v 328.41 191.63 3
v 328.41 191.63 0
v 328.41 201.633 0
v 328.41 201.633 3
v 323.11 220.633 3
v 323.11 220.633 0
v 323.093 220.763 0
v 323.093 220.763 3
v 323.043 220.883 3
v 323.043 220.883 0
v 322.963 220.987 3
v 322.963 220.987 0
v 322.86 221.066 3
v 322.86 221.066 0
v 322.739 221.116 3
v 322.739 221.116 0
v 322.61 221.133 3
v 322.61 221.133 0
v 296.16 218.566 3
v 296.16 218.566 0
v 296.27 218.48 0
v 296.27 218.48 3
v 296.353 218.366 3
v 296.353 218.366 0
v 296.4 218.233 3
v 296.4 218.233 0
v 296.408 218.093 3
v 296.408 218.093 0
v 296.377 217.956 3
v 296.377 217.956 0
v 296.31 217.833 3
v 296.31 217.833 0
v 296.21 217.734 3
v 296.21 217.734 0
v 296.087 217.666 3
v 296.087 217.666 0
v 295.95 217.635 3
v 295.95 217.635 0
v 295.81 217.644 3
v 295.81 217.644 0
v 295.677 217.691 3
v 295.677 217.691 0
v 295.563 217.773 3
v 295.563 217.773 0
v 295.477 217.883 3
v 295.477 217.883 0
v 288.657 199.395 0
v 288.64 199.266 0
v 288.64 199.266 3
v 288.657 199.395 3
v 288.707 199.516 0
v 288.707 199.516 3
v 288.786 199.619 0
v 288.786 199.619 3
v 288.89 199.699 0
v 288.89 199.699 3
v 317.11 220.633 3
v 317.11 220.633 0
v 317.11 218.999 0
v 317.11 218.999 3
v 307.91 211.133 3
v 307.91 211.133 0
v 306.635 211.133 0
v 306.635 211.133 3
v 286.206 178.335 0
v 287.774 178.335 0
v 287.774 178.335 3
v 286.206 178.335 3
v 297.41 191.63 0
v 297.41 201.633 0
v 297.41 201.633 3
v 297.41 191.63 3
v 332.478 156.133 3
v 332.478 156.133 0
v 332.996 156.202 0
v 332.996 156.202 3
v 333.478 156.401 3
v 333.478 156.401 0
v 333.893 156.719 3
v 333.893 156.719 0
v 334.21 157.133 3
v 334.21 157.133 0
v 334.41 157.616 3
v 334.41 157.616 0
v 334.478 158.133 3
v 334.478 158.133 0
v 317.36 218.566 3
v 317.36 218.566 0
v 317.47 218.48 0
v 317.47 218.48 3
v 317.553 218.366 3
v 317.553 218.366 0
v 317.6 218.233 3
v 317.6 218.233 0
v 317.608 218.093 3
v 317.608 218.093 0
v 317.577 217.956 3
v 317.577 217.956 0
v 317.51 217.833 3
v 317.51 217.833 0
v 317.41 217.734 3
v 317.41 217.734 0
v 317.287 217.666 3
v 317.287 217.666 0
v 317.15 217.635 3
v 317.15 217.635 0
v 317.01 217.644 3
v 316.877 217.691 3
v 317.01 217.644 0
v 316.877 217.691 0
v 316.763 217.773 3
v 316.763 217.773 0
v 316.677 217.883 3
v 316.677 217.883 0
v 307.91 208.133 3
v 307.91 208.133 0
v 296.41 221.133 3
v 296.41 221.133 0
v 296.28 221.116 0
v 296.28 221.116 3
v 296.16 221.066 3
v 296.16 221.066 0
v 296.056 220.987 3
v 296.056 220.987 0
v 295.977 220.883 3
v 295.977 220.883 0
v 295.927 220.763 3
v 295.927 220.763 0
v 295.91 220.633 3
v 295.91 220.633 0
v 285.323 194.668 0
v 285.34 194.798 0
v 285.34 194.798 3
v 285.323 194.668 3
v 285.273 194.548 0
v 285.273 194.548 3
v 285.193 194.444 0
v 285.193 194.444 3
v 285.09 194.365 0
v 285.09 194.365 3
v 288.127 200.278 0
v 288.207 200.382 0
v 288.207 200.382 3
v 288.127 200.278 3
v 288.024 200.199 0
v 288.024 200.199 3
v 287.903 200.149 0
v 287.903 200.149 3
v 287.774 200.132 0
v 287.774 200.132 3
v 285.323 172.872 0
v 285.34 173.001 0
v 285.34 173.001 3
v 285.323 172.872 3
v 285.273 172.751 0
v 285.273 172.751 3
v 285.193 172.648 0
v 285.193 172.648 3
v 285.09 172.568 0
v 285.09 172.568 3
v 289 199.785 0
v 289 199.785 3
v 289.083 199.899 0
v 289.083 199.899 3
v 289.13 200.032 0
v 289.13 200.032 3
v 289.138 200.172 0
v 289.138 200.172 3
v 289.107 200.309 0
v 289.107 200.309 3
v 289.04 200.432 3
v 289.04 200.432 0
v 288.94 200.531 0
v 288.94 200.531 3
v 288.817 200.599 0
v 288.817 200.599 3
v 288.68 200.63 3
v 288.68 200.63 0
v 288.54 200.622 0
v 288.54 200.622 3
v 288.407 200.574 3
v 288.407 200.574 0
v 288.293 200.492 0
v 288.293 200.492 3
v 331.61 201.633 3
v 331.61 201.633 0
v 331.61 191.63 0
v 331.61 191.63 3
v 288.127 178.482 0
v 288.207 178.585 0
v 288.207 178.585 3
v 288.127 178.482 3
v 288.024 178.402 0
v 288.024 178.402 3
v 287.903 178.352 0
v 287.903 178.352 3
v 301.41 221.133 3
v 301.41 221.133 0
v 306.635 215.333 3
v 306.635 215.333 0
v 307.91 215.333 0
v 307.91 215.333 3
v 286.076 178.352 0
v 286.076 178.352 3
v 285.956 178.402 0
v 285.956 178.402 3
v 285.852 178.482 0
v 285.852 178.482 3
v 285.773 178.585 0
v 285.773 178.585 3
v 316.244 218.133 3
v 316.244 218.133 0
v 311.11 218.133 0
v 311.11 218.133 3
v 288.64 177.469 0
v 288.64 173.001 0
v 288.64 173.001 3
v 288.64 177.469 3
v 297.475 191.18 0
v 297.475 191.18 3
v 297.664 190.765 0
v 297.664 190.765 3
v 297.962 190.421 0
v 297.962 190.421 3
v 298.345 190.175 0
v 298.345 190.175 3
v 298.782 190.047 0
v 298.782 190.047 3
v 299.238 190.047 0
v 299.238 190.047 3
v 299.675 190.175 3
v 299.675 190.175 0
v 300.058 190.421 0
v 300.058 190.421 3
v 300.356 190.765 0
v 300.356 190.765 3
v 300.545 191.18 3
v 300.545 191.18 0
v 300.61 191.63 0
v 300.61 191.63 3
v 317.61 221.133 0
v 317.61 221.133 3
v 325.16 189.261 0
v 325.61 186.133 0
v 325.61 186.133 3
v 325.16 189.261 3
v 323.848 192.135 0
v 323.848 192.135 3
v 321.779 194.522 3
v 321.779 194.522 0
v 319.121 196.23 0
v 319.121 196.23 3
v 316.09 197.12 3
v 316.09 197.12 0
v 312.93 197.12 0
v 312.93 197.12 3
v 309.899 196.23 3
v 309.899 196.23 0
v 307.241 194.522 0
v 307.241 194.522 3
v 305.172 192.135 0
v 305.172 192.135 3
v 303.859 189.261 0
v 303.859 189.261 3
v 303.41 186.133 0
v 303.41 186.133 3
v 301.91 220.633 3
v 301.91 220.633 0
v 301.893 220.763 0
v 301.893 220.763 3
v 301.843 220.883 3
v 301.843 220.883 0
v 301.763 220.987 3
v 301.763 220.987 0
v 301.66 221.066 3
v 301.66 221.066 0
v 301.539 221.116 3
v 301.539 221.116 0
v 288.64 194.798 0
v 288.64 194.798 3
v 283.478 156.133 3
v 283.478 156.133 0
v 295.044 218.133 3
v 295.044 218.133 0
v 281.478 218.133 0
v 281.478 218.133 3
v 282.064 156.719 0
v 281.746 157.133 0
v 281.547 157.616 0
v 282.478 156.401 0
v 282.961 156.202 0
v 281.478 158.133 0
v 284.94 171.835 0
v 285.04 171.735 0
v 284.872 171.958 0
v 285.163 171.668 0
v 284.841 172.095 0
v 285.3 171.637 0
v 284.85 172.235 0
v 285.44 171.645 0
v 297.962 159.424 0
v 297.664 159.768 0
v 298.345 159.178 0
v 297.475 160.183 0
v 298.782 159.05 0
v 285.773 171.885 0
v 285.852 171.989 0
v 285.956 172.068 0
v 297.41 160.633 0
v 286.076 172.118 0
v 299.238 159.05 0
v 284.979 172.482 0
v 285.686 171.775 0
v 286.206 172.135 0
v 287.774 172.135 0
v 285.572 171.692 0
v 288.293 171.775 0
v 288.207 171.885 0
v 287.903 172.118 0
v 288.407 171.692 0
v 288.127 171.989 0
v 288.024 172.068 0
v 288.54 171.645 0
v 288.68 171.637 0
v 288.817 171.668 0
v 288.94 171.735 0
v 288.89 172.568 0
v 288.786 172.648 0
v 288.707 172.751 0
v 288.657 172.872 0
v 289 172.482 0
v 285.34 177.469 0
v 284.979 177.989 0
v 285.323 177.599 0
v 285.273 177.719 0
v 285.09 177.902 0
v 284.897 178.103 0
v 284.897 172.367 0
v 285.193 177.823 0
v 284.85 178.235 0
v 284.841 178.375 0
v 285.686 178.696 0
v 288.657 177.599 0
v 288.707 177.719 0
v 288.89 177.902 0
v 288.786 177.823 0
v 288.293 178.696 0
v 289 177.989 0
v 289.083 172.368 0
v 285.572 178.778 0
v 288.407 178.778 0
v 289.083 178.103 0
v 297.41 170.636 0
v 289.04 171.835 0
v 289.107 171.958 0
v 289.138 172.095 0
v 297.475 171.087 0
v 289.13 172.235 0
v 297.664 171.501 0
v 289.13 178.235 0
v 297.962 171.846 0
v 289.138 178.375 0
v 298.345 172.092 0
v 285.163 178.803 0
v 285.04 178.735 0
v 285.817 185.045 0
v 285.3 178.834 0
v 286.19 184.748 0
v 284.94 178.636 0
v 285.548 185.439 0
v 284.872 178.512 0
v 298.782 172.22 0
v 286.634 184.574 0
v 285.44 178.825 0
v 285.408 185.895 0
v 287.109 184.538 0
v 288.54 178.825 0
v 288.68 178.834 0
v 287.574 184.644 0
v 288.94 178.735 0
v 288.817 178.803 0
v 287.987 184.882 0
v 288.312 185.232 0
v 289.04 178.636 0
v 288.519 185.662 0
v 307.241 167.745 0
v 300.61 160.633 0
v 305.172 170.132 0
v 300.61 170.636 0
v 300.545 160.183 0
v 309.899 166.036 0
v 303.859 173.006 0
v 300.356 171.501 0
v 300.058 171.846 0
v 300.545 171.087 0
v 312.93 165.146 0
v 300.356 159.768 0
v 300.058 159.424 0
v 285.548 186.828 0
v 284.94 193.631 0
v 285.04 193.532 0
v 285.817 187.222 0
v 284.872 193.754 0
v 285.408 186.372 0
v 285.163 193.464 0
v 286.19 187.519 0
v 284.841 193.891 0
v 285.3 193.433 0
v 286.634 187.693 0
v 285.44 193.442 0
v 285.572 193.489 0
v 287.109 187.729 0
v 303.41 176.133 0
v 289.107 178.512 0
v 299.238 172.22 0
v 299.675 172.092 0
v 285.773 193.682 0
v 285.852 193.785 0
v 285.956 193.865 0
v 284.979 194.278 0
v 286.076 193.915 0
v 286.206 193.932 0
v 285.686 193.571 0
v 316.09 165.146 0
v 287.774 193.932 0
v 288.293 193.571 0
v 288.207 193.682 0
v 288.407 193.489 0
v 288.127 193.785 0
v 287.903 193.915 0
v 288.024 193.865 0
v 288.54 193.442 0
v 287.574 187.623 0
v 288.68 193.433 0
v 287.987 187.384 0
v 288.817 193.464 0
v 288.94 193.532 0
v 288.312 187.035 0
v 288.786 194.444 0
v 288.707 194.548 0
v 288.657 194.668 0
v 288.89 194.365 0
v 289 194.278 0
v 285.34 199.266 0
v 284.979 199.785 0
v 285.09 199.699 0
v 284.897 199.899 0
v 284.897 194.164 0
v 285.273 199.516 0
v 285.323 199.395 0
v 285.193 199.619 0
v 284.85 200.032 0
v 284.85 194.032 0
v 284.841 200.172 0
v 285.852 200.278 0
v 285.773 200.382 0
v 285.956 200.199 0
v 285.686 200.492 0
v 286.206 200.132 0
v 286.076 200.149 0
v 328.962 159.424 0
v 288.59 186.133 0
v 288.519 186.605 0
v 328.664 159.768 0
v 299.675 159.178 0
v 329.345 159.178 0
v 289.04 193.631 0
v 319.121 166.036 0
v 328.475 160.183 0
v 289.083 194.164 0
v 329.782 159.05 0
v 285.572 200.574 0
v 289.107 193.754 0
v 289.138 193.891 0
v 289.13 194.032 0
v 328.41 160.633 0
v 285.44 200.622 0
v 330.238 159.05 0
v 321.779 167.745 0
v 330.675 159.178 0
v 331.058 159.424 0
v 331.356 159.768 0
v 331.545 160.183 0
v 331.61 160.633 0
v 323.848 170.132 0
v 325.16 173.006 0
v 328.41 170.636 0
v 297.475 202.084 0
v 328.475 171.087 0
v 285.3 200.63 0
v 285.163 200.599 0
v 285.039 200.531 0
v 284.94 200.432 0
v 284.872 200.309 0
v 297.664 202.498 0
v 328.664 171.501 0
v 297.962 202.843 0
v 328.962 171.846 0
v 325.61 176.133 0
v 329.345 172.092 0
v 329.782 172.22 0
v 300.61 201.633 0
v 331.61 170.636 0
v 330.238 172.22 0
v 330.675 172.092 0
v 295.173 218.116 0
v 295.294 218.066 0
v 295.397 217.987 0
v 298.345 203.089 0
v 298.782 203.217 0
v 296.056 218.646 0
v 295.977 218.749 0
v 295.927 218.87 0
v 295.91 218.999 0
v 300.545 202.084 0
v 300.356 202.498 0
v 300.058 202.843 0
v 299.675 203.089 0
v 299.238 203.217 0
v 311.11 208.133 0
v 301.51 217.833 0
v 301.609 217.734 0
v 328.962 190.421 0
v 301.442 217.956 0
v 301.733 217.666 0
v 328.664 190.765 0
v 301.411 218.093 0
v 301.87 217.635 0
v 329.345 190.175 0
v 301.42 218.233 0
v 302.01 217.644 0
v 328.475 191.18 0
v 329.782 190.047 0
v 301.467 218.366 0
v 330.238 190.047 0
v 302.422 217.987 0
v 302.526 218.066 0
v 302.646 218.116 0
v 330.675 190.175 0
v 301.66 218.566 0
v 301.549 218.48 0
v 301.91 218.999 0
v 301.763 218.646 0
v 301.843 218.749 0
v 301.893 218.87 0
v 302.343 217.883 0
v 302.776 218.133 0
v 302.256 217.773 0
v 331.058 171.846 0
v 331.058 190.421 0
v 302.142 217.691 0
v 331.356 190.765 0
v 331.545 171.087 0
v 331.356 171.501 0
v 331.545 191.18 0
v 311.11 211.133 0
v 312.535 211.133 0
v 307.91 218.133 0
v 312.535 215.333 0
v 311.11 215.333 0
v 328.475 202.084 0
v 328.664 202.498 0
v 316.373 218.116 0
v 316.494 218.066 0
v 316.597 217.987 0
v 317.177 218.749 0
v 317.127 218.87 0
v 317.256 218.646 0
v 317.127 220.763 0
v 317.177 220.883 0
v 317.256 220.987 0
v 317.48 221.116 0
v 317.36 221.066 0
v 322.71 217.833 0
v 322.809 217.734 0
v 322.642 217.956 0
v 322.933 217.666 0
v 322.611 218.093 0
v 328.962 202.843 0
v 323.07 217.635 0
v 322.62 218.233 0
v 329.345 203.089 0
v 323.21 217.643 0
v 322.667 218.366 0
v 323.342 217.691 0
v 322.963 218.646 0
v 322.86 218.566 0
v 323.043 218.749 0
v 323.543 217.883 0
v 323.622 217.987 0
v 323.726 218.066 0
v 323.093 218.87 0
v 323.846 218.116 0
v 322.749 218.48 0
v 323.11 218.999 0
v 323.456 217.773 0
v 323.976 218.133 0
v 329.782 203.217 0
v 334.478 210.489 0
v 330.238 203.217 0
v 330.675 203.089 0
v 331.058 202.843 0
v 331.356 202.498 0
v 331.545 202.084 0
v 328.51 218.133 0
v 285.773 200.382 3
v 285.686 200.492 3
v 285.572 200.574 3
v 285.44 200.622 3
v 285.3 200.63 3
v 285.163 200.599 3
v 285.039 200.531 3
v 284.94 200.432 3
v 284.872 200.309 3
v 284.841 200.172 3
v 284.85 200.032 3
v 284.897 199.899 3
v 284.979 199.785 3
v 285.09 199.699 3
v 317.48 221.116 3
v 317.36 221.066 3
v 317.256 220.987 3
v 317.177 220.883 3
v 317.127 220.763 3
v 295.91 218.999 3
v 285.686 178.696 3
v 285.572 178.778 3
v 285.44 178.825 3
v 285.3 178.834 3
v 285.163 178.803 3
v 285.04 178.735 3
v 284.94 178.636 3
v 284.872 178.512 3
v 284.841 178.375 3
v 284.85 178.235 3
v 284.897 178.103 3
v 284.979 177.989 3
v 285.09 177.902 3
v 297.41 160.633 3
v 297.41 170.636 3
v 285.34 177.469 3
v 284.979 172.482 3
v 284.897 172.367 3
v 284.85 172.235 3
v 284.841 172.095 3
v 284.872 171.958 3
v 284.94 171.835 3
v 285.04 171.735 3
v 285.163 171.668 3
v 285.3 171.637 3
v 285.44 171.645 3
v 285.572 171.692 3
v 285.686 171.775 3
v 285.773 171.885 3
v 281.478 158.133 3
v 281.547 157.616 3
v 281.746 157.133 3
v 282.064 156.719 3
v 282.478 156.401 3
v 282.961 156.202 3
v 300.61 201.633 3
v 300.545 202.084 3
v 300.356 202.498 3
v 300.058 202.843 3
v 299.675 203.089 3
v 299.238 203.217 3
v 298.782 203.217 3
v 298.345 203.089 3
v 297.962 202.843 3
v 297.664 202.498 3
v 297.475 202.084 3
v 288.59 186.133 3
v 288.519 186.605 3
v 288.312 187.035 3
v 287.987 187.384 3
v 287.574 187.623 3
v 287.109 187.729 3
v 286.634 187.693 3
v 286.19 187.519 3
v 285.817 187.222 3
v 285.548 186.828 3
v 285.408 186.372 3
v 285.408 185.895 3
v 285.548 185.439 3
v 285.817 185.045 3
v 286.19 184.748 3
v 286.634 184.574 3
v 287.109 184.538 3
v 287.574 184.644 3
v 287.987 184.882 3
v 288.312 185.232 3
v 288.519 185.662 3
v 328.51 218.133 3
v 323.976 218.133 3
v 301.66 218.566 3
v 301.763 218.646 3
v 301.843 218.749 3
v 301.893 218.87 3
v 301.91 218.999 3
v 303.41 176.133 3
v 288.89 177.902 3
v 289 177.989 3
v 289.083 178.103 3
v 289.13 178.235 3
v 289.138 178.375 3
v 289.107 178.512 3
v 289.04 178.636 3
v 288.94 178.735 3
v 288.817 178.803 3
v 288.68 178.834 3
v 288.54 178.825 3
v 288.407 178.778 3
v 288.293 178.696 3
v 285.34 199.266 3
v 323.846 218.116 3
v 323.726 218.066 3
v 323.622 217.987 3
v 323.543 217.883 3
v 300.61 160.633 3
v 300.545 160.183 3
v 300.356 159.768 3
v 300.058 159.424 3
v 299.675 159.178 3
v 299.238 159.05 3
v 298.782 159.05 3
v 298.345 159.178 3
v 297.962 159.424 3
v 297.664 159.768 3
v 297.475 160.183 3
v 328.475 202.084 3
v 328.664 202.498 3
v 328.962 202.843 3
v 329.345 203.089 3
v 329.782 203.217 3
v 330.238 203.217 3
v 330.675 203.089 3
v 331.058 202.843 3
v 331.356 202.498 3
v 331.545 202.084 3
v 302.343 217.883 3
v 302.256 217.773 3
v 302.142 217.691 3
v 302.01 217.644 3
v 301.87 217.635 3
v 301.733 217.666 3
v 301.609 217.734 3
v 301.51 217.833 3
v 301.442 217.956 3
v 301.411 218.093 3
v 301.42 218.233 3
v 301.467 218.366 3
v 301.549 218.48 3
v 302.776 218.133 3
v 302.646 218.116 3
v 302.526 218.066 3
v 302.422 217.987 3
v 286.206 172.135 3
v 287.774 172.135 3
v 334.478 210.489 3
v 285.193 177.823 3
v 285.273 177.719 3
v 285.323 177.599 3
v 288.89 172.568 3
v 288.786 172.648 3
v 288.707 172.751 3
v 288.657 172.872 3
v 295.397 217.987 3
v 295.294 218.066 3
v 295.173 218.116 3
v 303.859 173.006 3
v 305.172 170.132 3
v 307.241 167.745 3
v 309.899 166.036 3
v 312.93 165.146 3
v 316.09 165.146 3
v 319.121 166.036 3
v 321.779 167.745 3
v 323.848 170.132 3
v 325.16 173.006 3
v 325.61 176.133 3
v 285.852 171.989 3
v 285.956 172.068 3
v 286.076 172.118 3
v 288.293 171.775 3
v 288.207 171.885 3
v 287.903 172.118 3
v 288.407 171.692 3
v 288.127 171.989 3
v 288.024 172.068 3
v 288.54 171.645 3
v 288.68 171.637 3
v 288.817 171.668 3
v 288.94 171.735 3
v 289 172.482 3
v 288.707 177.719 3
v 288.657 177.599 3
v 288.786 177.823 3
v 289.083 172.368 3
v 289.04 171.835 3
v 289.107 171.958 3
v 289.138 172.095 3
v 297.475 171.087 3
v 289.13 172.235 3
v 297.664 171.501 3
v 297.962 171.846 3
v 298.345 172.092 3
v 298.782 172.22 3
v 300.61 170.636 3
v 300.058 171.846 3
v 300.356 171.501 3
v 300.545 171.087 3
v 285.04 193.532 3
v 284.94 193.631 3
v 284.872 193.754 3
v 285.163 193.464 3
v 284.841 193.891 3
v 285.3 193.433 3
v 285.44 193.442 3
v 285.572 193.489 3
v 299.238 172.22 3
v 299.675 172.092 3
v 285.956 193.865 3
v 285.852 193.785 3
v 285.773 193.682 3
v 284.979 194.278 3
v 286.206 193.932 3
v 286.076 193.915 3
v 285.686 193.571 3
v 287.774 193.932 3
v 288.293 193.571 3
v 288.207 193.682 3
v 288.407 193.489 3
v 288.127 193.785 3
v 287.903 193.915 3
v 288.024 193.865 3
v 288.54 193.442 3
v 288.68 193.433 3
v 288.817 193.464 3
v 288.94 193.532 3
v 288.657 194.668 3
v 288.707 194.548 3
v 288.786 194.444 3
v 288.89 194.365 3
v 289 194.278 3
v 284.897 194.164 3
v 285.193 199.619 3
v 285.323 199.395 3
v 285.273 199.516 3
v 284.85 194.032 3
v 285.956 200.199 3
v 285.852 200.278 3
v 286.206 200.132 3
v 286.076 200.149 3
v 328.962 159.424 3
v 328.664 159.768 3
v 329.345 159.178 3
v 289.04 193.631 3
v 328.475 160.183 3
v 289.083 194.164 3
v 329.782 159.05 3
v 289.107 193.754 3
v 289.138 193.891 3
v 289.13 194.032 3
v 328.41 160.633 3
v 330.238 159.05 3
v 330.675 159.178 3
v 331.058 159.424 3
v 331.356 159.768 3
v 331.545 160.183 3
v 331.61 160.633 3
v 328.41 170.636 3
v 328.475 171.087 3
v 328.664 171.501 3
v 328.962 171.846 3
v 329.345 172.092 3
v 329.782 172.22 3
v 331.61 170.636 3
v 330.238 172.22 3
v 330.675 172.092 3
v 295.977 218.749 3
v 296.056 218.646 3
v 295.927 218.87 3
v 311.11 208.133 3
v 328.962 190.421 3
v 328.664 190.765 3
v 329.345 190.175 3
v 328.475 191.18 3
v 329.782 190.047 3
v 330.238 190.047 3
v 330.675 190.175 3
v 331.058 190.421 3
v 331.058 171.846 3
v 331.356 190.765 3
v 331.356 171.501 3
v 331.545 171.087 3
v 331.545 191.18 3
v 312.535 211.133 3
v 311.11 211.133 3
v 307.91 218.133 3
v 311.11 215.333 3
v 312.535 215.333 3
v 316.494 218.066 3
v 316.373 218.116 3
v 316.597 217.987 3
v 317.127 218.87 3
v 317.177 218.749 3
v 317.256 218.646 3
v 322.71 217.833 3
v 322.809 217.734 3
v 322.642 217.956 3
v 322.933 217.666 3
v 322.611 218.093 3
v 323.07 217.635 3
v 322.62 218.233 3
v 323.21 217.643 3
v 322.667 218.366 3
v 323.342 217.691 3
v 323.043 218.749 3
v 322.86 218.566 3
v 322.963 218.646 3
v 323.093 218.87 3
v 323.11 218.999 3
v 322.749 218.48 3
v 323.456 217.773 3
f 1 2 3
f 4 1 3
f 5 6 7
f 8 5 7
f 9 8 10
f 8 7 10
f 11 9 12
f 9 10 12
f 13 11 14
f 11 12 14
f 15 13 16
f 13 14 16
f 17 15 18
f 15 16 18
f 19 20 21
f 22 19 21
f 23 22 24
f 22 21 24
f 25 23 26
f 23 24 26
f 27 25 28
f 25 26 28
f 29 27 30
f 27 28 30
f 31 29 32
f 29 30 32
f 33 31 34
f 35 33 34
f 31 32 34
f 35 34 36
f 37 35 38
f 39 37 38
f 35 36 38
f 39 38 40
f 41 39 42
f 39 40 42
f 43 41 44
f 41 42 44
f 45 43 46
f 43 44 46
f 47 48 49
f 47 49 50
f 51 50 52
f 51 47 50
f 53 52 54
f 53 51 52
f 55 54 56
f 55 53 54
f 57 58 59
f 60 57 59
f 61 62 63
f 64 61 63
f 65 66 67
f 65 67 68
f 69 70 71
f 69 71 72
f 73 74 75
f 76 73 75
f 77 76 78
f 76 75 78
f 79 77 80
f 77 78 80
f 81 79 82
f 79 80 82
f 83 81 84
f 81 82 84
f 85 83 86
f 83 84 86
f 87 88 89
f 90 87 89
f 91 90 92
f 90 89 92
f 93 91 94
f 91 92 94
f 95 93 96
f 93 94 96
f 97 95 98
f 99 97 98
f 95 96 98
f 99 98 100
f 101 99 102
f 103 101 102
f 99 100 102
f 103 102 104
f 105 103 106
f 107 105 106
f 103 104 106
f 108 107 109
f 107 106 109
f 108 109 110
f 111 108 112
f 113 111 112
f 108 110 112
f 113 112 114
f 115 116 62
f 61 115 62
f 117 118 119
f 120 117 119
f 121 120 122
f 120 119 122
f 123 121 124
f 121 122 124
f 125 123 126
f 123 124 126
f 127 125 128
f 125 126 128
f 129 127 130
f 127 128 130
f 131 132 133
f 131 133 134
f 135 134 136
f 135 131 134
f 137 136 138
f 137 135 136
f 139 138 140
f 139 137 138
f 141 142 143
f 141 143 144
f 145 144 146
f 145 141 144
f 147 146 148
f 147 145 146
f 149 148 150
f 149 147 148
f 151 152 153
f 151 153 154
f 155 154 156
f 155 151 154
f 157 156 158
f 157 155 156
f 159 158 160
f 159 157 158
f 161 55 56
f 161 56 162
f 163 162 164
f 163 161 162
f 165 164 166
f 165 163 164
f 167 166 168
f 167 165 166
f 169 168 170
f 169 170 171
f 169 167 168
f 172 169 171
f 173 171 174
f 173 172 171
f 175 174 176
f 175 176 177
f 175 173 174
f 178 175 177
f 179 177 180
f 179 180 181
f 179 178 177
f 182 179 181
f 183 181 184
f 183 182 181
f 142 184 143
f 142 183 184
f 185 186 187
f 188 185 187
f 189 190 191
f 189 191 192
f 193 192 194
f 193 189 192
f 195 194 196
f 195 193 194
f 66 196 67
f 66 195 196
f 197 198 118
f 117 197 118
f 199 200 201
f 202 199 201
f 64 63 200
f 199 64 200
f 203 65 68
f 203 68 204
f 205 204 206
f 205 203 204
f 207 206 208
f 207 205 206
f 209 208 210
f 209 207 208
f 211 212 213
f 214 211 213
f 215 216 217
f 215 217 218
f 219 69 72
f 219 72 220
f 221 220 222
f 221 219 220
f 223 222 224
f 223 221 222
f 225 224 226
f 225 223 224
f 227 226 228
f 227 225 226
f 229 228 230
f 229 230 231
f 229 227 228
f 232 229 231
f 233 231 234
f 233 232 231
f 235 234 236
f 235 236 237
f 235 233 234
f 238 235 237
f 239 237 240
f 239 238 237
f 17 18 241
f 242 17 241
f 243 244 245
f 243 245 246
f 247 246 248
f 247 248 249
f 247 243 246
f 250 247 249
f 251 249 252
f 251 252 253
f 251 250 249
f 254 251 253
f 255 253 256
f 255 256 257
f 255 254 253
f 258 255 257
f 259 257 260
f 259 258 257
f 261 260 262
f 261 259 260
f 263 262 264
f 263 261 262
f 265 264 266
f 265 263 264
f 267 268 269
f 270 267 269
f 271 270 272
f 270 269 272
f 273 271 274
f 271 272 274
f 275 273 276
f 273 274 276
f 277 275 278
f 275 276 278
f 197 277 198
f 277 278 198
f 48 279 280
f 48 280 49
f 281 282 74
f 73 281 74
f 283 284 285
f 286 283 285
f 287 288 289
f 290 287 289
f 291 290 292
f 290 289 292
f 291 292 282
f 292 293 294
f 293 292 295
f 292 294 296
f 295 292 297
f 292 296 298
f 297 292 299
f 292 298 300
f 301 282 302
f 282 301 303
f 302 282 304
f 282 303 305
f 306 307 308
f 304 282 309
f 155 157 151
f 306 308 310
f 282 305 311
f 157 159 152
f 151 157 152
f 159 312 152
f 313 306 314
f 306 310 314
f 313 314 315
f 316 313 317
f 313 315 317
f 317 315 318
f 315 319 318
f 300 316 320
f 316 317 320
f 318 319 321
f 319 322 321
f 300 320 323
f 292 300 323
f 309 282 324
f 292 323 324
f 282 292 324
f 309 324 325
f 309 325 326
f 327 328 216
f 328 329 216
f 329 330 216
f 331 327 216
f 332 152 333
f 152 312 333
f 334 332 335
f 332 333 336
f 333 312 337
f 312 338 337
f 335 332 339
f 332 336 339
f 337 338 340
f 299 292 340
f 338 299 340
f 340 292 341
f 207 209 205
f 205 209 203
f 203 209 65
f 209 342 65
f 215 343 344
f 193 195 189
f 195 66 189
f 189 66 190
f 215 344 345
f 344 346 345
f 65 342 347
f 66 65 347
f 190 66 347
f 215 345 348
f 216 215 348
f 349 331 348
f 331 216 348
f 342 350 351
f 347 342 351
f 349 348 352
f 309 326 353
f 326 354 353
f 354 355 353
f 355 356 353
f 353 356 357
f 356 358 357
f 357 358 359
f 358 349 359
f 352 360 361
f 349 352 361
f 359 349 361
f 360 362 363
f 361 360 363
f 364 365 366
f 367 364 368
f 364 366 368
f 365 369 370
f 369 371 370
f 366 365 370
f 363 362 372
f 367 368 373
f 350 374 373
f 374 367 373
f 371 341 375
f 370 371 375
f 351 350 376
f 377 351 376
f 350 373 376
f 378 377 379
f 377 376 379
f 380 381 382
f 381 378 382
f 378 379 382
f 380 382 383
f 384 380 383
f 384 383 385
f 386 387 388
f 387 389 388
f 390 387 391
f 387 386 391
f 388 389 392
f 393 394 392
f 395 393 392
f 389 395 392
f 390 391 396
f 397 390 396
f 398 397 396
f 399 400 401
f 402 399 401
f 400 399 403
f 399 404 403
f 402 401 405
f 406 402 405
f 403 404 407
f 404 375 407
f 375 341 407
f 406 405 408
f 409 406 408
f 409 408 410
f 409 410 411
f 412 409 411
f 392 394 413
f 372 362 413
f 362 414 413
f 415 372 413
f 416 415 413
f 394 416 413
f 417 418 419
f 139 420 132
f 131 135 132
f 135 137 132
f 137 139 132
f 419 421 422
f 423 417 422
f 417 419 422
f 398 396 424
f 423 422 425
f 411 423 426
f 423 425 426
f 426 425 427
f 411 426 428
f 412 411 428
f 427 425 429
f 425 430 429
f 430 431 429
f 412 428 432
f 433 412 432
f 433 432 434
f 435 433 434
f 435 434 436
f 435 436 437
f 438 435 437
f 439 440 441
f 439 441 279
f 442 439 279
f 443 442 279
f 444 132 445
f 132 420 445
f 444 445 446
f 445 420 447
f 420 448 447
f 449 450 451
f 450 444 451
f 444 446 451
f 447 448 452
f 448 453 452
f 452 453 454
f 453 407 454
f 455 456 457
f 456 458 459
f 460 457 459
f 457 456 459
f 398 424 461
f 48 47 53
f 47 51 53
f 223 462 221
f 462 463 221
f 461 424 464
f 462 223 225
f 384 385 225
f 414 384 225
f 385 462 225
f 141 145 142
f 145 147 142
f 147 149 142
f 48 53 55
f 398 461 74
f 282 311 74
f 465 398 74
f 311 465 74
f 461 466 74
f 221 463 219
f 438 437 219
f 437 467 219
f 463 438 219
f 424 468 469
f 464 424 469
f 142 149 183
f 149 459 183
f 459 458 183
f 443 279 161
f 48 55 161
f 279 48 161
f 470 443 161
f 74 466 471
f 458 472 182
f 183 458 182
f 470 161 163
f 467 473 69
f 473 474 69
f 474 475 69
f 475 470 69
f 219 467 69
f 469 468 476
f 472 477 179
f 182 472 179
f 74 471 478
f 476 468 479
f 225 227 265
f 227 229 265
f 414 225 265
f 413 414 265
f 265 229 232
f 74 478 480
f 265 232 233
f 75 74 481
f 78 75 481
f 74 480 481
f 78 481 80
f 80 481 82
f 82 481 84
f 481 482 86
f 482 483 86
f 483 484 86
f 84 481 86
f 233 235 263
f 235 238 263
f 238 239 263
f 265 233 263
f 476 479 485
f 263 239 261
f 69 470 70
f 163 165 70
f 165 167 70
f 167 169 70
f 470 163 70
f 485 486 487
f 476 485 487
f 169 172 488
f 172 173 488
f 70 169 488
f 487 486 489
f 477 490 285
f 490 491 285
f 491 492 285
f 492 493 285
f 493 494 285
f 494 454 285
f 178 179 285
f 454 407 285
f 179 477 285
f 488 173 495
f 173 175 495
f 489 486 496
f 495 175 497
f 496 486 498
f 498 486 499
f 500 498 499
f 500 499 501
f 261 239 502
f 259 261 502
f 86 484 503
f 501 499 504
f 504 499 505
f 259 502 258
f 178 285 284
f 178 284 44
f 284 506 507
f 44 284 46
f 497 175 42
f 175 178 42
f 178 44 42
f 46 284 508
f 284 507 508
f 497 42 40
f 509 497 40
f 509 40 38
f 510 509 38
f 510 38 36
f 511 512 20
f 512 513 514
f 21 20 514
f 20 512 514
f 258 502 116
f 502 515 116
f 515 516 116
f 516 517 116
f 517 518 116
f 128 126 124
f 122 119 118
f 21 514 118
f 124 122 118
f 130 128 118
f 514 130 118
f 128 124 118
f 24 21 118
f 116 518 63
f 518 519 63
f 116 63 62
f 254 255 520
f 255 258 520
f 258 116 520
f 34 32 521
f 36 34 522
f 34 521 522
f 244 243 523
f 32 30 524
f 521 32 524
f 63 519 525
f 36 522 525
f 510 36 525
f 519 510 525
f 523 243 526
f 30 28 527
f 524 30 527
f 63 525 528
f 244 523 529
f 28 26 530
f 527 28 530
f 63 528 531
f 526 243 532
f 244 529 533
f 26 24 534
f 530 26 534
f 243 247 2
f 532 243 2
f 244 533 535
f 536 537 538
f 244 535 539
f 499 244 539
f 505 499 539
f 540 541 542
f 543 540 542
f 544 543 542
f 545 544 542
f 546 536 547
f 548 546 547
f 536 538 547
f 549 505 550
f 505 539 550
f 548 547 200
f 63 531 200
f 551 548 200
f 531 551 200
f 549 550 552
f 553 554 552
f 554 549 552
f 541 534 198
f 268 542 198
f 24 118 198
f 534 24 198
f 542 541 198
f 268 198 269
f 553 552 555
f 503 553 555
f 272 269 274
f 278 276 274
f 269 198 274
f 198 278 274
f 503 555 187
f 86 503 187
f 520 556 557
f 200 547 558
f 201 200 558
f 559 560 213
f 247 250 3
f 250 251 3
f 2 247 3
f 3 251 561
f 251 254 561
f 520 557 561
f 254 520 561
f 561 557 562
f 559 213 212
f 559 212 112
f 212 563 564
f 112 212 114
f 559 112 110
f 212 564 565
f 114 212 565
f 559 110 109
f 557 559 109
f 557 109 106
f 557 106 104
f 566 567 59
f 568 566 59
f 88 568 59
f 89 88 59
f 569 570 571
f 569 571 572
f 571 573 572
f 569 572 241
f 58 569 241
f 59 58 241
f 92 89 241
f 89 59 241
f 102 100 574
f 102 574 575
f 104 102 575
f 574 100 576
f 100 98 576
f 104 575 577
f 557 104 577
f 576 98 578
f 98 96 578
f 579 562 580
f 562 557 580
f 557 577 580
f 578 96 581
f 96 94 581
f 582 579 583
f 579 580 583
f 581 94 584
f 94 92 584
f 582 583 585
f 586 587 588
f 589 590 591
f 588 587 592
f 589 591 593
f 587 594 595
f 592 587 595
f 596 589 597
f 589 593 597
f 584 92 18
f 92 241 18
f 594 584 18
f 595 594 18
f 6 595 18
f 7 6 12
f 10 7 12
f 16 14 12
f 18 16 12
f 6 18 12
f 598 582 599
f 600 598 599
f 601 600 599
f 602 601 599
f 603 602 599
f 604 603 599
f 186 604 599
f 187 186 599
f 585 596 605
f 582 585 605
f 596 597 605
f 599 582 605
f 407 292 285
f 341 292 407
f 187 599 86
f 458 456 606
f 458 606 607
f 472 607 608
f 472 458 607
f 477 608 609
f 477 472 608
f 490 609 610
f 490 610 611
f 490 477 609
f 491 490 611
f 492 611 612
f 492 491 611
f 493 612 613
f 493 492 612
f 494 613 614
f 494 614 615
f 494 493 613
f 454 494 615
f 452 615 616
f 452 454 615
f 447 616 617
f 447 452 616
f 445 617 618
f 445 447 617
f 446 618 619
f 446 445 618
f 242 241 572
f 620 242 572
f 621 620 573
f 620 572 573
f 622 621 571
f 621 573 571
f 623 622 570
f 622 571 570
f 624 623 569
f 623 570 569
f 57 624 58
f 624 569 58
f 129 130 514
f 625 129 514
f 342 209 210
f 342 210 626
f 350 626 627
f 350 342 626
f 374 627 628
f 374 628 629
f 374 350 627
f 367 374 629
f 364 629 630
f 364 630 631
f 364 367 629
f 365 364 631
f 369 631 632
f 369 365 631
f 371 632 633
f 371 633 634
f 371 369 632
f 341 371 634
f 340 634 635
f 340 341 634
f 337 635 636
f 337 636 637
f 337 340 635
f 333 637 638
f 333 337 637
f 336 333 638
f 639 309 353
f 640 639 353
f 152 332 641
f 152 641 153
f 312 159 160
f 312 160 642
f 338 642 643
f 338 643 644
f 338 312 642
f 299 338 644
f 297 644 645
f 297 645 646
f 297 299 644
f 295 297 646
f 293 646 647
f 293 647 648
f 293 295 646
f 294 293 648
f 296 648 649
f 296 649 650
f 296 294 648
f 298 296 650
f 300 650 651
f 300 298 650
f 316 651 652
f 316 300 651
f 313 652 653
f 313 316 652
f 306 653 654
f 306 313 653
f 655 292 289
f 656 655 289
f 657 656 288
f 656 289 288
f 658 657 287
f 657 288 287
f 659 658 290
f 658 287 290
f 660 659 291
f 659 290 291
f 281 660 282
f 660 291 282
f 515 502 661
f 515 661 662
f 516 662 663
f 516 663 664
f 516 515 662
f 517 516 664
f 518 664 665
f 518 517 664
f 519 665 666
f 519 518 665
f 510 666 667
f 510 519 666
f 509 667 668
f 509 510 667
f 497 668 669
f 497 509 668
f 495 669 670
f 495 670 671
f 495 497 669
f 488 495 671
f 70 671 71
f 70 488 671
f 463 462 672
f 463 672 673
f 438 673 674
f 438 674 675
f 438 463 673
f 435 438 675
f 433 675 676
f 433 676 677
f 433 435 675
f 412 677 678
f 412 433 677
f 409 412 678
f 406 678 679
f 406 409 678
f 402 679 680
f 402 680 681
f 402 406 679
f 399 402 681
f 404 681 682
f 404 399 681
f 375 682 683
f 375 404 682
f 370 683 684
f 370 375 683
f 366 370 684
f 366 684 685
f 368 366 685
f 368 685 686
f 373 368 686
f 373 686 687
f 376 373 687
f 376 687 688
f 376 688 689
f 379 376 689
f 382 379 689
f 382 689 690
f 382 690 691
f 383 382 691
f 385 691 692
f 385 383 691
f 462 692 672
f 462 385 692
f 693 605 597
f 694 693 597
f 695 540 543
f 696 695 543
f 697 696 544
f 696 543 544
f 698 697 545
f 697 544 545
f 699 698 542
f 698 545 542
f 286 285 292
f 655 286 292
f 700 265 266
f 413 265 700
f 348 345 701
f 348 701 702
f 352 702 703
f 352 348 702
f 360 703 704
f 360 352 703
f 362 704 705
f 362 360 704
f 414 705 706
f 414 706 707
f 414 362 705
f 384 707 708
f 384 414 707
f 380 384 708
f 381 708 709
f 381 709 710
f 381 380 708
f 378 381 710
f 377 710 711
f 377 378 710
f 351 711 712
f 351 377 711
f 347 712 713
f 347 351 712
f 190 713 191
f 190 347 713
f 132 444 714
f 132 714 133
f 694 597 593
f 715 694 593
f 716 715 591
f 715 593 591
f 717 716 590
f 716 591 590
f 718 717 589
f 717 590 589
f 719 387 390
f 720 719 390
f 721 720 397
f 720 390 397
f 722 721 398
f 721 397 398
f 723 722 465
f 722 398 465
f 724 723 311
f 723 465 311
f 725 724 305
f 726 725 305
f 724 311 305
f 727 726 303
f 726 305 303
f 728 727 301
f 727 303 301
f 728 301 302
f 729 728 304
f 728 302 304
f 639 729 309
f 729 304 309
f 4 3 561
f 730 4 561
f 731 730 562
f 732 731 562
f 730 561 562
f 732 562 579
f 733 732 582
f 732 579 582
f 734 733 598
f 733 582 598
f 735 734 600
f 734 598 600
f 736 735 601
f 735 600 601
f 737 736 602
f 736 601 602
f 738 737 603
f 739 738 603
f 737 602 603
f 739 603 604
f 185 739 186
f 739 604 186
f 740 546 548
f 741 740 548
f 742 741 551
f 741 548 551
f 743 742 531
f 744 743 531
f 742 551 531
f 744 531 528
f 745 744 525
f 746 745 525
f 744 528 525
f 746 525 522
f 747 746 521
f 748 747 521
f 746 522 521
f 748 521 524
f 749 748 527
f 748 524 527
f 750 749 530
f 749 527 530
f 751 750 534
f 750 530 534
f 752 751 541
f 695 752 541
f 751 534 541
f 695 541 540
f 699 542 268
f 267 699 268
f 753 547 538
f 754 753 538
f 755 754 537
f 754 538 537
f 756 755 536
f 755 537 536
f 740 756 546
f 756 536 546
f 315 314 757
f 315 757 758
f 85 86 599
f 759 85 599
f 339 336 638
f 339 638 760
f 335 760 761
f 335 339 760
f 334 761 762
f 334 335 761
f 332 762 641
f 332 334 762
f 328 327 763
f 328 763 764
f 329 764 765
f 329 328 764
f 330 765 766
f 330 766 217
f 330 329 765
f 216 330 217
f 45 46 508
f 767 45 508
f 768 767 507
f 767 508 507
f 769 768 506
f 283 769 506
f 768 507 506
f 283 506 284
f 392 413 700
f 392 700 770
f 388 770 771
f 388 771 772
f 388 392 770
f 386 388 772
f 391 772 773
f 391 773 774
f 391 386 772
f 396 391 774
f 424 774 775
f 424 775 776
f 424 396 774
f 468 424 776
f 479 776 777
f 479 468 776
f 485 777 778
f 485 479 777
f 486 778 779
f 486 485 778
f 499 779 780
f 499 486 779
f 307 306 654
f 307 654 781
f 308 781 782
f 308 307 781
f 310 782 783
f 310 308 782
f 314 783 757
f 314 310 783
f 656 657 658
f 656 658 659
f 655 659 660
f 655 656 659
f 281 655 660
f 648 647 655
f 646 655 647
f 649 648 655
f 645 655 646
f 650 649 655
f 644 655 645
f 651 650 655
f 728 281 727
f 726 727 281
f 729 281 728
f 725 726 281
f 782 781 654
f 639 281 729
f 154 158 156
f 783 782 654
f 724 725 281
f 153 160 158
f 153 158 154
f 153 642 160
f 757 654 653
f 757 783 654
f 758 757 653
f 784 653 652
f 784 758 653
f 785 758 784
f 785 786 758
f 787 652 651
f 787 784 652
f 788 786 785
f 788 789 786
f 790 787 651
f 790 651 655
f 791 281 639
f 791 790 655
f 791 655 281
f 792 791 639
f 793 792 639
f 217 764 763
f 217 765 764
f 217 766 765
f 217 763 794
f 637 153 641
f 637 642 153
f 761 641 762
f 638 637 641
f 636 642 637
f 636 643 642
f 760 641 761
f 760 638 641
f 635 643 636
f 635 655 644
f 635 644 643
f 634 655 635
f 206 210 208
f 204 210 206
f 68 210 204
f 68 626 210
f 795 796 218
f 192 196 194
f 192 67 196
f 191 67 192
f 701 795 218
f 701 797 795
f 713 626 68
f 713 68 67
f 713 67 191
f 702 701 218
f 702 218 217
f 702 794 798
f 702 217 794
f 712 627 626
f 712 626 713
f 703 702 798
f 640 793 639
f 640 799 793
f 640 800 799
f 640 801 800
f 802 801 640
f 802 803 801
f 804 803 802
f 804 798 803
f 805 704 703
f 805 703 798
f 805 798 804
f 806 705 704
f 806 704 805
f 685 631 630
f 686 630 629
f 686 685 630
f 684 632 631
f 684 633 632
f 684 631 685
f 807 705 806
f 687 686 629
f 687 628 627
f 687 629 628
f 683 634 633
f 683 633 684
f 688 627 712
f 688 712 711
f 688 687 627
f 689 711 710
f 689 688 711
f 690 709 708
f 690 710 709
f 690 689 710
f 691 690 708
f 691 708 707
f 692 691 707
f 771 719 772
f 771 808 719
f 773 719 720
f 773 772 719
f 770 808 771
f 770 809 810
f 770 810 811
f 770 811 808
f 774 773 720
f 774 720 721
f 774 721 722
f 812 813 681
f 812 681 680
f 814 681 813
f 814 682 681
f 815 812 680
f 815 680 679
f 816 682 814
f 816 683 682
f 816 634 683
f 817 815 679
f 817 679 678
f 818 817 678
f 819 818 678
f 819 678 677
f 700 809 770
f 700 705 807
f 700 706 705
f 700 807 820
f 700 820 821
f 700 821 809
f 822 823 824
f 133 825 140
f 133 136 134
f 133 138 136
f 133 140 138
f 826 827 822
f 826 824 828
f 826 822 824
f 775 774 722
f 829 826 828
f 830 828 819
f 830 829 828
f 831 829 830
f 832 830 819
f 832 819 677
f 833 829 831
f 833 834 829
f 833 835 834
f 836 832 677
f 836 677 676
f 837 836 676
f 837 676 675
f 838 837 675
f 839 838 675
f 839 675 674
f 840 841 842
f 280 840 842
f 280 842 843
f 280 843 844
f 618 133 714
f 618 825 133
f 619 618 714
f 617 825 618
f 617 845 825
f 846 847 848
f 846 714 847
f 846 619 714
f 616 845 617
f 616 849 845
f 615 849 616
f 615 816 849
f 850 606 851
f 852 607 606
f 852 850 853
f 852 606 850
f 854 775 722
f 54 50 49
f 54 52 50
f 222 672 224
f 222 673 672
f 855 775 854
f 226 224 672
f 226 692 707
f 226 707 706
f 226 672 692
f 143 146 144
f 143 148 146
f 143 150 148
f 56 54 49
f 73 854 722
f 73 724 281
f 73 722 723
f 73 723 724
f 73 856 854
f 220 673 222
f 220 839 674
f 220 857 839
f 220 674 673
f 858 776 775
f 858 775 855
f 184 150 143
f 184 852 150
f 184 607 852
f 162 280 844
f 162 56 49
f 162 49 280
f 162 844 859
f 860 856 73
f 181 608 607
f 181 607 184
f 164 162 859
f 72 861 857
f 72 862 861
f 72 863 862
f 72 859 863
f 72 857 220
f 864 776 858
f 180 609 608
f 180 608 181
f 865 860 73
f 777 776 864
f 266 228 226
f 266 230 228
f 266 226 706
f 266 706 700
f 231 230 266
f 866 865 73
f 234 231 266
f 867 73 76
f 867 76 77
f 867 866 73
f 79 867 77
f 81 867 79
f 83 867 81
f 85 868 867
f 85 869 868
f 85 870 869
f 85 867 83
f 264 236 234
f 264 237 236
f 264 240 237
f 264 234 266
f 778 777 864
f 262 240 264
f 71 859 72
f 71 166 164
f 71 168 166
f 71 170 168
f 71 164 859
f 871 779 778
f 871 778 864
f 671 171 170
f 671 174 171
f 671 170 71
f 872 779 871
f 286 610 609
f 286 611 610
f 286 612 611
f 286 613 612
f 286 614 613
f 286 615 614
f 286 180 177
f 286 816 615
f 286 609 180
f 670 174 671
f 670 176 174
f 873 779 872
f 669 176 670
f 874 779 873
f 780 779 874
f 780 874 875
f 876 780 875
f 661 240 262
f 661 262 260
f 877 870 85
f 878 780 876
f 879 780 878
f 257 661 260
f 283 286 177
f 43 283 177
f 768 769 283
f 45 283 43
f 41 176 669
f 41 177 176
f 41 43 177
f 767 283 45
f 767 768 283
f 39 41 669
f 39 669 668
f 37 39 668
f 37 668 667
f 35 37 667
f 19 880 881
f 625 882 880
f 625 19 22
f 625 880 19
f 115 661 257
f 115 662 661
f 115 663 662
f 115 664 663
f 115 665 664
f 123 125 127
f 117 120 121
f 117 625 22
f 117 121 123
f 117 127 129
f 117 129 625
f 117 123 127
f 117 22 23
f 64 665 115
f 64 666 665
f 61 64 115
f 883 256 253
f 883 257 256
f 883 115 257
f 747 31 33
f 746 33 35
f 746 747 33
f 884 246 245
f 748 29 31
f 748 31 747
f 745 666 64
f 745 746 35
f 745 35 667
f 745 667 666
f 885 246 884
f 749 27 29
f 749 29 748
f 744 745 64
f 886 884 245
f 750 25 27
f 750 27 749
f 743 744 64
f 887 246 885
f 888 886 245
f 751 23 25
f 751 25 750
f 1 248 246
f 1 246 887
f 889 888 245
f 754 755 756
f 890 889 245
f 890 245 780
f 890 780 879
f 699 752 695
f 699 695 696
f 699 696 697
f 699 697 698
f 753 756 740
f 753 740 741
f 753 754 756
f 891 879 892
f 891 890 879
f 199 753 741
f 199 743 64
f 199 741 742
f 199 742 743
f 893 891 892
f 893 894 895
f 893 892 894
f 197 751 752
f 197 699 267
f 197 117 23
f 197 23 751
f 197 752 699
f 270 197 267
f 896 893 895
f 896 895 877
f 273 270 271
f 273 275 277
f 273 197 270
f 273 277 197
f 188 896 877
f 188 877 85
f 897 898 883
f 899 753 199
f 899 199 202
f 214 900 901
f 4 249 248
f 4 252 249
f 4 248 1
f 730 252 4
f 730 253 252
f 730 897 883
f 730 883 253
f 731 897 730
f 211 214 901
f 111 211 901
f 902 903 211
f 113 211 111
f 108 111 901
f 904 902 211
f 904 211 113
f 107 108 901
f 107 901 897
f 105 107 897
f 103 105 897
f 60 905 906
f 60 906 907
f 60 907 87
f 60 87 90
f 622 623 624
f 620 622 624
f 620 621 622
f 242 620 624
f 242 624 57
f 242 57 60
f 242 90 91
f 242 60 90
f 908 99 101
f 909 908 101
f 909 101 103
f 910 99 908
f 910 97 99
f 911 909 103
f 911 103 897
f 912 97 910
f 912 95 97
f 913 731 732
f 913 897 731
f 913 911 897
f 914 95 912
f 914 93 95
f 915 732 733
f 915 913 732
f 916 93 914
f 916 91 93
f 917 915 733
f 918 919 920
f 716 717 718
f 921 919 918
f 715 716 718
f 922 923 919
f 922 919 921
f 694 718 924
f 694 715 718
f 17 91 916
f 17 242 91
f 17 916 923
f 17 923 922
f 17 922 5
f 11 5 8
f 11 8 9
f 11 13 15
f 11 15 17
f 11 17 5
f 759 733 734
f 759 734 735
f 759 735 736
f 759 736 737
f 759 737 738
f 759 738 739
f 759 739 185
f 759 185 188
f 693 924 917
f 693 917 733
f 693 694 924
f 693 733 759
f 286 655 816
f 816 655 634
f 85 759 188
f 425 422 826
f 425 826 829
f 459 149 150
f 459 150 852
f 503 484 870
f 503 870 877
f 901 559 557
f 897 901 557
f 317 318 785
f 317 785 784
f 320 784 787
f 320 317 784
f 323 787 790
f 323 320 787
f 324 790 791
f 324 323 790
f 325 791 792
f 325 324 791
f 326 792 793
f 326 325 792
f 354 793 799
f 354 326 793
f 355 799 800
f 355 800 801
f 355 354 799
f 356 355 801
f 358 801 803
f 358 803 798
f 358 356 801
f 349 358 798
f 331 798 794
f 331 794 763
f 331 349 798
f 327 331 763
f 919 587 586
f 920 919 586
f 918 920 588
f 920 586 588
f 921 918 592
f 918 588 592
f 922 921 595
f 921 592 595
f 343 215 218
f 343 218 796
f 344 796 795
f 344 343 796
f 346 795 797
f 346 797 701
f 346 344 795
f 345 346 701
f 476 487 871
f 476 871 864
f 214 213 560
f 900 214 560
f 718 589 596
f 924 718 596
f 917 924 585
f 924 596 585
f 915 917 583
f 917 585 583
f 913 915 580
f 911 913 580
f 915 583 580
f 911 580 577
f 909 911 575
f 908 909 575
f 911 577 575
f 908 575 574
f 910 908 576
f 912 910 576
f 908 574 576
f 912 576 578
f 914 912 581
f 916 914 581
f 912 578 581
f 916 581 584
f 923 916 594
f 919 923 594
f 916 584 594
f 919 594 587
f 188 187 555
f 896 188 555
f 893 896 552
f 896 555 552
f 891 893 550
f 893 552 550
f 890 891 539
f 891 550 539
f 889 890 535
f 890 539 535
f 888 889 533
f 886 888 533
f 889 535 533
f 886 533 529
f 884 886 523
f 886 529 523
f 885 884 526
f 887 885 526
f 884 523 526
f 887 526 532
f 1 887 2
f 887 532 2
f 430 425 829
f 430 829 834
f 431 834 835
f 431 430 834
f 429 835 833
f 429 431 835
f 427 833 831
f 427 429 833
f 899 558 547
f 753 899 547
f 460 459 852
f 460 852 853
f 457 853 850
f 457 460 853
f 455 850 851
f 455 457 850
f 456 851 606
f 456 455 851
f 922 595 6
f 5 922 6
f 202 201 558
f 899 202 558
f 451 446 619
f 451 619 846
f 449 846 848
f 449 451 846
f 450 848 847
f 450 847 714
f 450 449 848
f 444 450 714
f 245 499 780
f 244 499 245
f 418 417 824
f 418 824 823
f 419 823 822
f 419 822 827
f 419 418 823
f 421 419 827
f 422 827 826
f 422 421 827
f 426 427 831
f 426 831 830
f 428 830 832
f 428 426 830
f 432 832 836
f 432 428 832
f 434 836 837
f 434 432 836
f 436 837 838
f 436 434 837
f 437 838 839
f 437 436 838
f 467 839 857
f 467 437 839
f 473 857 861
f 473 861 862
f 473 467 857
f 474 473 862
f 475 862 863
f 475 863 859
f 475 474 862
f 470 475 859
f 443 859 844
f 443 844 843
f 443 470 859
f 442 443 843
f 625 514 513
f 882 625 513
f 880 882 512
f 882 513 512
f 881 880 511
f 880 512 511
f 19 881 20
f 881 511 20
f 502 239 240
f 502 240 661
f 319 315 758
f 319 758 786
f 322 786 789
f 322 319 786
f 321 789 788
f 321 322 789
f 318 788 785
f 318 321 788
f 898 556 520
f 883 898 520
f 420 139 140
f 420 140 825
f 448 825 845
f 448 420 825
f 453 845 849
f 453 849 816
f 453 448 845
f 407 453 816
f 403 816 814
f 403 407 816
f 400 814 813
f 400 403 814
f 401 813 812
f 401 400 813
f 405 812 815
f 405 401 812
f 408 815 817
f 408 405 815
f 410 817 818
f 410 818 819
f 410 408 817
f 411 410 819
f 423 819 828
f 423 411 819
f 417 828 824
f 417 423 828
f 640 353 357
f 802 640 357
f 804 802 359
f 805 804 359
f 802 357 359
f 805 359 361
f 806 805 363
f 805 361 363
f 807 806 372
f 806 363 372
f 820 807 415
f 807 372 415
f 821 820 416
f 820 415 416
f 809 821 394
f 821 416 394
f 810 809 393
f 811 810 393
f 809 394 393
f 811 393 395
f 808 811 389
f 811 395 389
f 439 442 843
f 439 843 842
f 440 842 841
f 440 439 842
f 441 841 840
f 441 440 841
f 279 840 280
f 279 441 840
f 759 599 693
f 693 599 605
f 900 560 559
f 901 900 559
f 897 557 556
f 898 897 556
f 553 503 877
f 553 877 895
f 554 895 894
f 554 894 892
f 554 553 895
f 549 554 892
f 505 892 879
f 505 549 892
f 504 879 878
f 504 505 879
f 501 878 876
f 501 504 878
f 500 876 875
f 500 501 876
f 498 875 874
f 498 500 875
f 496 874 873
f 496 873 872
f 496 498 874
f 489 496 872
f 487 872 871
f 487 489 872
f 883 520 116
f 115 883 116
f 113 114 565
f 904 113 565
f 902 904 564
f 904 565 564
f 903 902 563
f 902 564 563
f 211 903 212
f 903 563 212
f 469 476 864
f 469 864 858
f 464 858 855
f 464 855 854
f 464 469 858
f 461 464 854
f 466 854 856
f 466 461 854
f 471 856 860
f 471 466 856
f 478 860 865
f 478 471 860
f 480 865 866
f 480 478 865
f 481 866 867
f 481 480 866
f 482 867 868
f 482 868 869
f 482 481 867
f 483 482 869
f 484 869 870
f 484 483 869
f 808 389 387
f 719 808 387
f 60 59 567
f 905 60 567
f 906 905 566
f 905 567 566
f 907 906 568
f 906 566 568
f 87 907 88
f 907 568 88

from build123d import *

# Parameters (mm, degrees)
MODEL_R             = 1.6
BOSS_EXTRUDE1_DEPTH = 3


with BuildPart() as part:
    # Model → Boss-Extrude1 (new body)
    with BuildSketch(Plane.XY):
        with BuildLine():
            Line((295.043822464, 218.133419689), (281.478366665, 218.133419689))
            Line((281.478366665, 218.133419689), (281.478366665, 158.133416479))
            ThreePointArc((281.478366665, 158.133416479), (282.064153103, 156.719202917), (283.478366665, 156.133416479))
            Line((283.478366665, 156.133416479), (332.478366665, 156.133416479))
            ThreePointArc((332.478366665, 156.133416479), (333.892580227, 156.719202917), (334.478366665, 158.133416479))
            Line((334.478366665, 158.133416479), (334.478366665, 210.48904049))
            Line((334.478366665, 210.48904049), (328.509839464, 218.133396046))
            Line((328.509839464, 218.133396046), (323.975870464, 218.133396046))
            ThreePointArc((323.975870464, 218.133396046), (323.725870171, 218.066408731), (323.542857332, 217.883395759))
            ThreePointArc((323.542857332, 217.883395759), (322.756291514, 217.779840053), (322.859842674, 218.566406469))
            ThreePointArc((322.859842674, 218.566406469), (323.042854191, 218.749419176), (323.109840891, 218.999418473))
            Line((323.109840891, 218.999418473), (323.109840891, 220.633447473))
            ThreePointArc((323.109840891, 220.633447473), (322.963394282, 220.987000863), (322.609840891, 221.133447473))
            Line((322.609840891, 221.133447473), (317.609843891, 221.133447473))
            ThreePointArc((317.609843891, 221.133447473), (317.256293472, 220.987003641), (317.109844085, 220.633455522))
            Line((317.109844085, 220.633455522), (317.109844085, 218.999428522))
            ThreePointArc((317.109844085, 218.999428522), (317.176831025, 218.749428628), (317.35984329, 218.566415765))
            ThreePointArc((317.35984329, 218.566415765), (317.463395273, 217.779850295), (316.676829874, 217.883402813))
            ThreePointArc((316.676829874, 217.883402813), (316.49381775, 218.066414713), (316.243818787, 218.133402112))
            Line((316.243818787, 218.133402112), (311.109839721, 218.133402112))
            Line((311.109839721, 218.133402112), (311.109839721, 215.333404229))
            Line((311.109839721, 215.333404229), (312.534860417, 215.333404229))
            Line((312.534860417, 215.333404229), (312.534860417, 211.133417963))
            Line((312.534860417, 211.133417963), (311.109850498, 211.133417963))
            Line((311.109850498, 211.133417963), (311.109850498, 208.133417963))
            Line((311.109850498, 208.133417963), (307.909850498, 208.133417963))
            Line((307.909850498, 208.133417963), (307.909850498, 211.133417963))
            Line((307.909850498, 211.133417963), (306.634859186, 211.133417963))
            Line((306.634859186, 211.133417963), (306.634859186, 215.333417963))
            Line((306.634859186, 215.333417963), (307.909850498, 215.333417963))
            Line((307.909850498, 215.333417963), (307.909850498, 218.133417963))
            Line((307.909850498, 218.133417963), (302.775874676, 218.133417963))
            ThreePointArc((302.775874676, 218.133417963), (302.525874676, 218.066430665), (302.342861974, 217.883417963))
            ThreePointArc((302.342861974, 217.883417963), (301.556296087, 217.779862777), (301.659847768, 218.566429125))
            ThreePointArc((301.659847768, 218.566429125), (301.842859406, 218.749441711), (301.909846272, 218.999440963))
            Line((301.909846272, 218.999440963), (301.909846272, 220.633469963))
            ThreePointArc((301.909846272, 220.633469963), (301.763399662, 220.987023354), (301.409846272, 221.133469963))
            Line((301.409846272, 221.133469963), (296.409849272, 221.133469963))
            ThreePointArc((296.409849272, 221.133469963), (296.056295709, 220.987026085), (295.909846369, 220.633474785))
            Line((295.909846369, 220.633474785), (295.909846369, 218.999447785))
            ThreePointArc((295.909846369, 218.999447785), (295.976833795, 218.749448021), (296.159846417, 218.566435514))
            ThreePointArc((296.159846417, 218.566435514), (296.263399931, 217.779870247), (295.47683433, 217.883421233))
            ThreePointArc((295.47683433, 217.883421233), (295.293821724, 218.066432851), (295.043822464, 218.133419689))
        make_face()
        with Locations((286.989833469, 186.133406309)):
            Circle(MODEL_R, mode=Mode.SUBTRACT)
        with BuildLine():
            Line((325.609838719, 176.133405309), (325.609838719, 186.133405309))
            ThreePointArc((325.609838719, 186.133405309), (314.509838719, 197.233405309), (303.409838719, 186.133405309))
            Line((303.409838719, 186.133405309), (303.409838719, 176.133405309))
            ThreePointArc((303.409838719, 176.133405309), (314.509838719, 165.033405309), (325.609838719, 176.133405309))
        make_face(mode=Mode.SUBTRACT)
        with BuildLine():
            Line((331.609838719, 160.633405309), (331.609838719, 170.636460624))
            ThreePointArc((331.609838719, 170.636460624), (330.009838719, 172.236460624), (328.409838719, 170.636460624))
            Line((328.409838719, 170.636460624), (328.409838719, 160.633405309))
            ThreePointArc((328.409838719, 160.633405309), (330.009838719, 159.033405309), (331.609838719, 160.633405309))
        make_face(mode=Mode.SUBTRACT)
        with BuildLine():
            Line((331.609838719, 201.633405309), (331.609838719, 191.630349994))
            ThreePointArc((331.609838719, 191.630349994), (330.009838719, 190.030349994), (328.409838719, 191.630349994))
            Line((328.409838719, 191.630349994), (328.409838719, 201.633405309))
            ThreePointArc((328.409838719, 201.633405309), (330.009838719, 203.233405309), (331.609838719, 201.633405309))
        make_face(mode=Mode.SUBTRACT)
        with BuildLine():
            Line((297.409838719, 160.633405309), (297.409838719, 170.636460624))
            ThreePointArc((297.409838719, 170.636460624), (299.009838719, 172.236460624), (300.609838719, 170.636460624))
            Line((300.609838719, 170.636460624), (300.609838719, 160.633405309))
            ThreePointArc((300.609838719, 160.633405309), (299.009838719, 159.033405309), (297.409838719, 160.633405309))
        make_face(mode=Mode.SUBTRACT)
        with BuildLine():
            Line((297.409838719, 201.633405309), (297.409838719, 191.630349994))
            ThreePointArc((297.409838719, 191.630349994), (299.009838719, 190.030349994), (300.609838719, 191.630349994))
            Line((300.609838719, 191.630349994), (300.609838719, 201.633405309))
            ThreePointArc((300.609838719, 201.633405309), (299.009838719, 203.233405309), (297.409838719, 201.633405309))
        make_face(mode=Mode.SUBTRACT)
        with BuildLine():
            Line((288.639792166, 173.001169926), (288.639792166, 177.469119926))
            ThreePointArc((288.639792166, 177.469119926), (288.706781285, 177.719120392), (288.889796147, 177.902132238))
            ThreePointArc((288.889796147, 177.902132238), (288.993345727, 178.688698026), (288.206780642, 178.585143097))
            ThreePointArc((288.206780642, 178.585143097), (288.023768466, 178.402130146), (287.773768823, 178.335142269))
            Line((287.773768823, 178.335142269), (286.205898823, 178.335142269))
            ThreePointArc((286.205898823, 178.335142269), (285.955899571, 178.402129135), (285.772886985, 178.585140772))
            ThreePointArc((285.772886985, 178.585140772), (284.986321396, 178.688691846), (285.089874823, 177.902126567))
            ThreePointArc((285.089874823, 177.902126567), (285.272887674, 177.719113607), (285.339874823, 177.469113269))
            Line((285.339874823, 177.469113269), (285.339874823, 173.001163269))
            ThreePointArc((285.339874823, 173.001163269), (285.272887957, 172.751164017), (285.089876319, 172.568151431))
            ThreePointArc((285.089876319, 172.568151431), (284.986324638, 171.781585083), (285.772890525, 171.885140269))
            ThreePointArc((285.772890525, 171.885140269), (285.955903052, 172.06815287), (286.205902823, 172.135140269))
            Line((286.205902823, 172.135140269), (287.773770823, 172.135140269))
            ThreePointArc((287.773770823, 172.135140269), (288.023770203, 172.068153881), (288.206783139, 171.885142594))
            ThreePointArc((288.206783139, 171.885142594), (288.993349685, 171.781592418), (288.889792994, 172.568158106))
            ThreePointArc((288.889792994, 172.568158106), (288.706780043, 172.751170283), (288.639792166, 173.001169926))
        make_face(mode=Mode.SUBTRACT)
        with BuildLine():
            Line((285.339870115, 199.26564477), (285.339870115, 194.79769477))
            ThreePointArc((285.339870115, 194.79769477), (285.272883249, 194.547695518), (285.089871611, 194.364682932))
            ThreePointArc((285.089871611, 194.364682932), (284.986320538, 193.578117343), (285.772885817, 193.68167077))
            ThreePointArc((285.772885817, 193.68167077), (285.955898344, 193.864683371), (286.205898115, 193.93167077))
            Line((286.205898115, 193.93167077), (287.773766115, 193.93167077))
            ThreePointArc((287.773766115, 193.93167077), (288.023765495, 193.864684382), (288.206778431, 193.681673095))
            ThreePointArc((288.206778431, 193.681673095), (288.993344977, 193.578122919), (288.889788286, 194.364688607))
            ThreePointArc((288.889788286, 194.364688607), (288.706775085, 194.547701217), (288.639787458, 194.797701427))
            Line((288.639787458, 194.797701427), (288.639787458, 199.265650427))
            ThreePointArc((288.639787458, 199.265650427), (288.70677658, 199.515650897), (288.889791447, 199.698662743))
            ThreePointArc((288.889791447, 199.698662743), (288.993341016, 200.485228531), (288.206775935, 200.381673598))
            ThreePointArc((288.206775935, 200.381673598), (288.023763758, 200.198660647), (287.773764115, 200.13167277))
            Line((287.773764115, 200.13167277), (286.205894115, 200.13167277))
            ThreePointArc((286.205894115, 200.13167277), (285.955894863, 200.198659636), (285.772882277, 200.381671273))
            ThreePointArc((285.772882277, 200.381671273), (284.986316688, 200.485222347), (285.089870115, 199.698657068))
            ThreePointArc((285.089870115, 199.698657068), (285.272882716, 199.515644541), (285.339870115, 199.26564477))
        make_face(mode=Mode.SUBTRACT)
    extrude(amount=BOSS_EXTRUDE1_DEPTH)


solid = part.part
